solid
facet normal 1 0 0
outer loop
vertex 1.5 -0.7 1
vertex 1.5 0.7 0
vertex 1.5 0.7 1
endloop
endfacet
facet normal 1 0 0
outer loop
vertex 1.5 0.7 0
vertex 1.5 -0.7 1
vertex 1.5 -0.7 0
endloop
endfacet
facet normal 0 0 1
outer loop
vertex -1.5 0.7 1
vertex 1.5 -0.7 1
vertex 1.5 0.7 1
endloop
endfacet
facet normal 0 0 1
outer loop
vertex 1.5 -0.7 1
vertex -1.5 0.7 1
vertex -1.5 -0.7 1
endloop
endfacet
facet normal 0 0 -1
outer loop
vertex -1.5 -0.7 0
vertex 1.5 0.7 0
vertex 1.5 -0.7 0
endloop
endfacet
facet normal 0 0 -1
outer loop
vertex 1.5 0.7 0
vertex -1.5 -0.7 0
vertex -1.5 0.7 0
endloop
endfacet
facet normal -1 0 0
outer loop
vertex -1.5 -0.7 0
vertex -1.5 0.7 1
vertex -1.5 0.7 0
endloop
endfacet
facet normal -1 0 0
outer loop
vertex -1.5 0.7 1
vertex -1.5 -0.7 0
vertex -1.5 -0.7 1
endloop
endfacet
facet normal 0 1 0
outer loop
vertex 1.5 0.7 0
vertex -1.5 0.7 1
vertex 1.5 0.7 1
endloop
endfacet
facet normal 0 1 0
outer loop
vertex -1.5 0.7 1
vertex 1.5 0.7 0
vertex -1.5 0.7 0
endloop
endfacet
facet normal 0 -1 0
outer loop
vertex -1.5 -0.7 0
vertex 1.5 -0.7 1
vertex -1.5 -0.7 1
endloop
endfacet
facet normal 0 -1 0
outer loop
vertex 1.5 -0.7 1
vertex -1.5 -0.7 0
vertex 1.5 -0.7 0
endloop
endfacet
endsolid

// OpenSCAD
$fn=64;

smd_size = [3, 1.4, 1.0];

module smd_body(size=[3,1.4,1.0]) {
    translate([0,0,size[2]/2])
        cube(size, center=true);
}

module smd_terminal(size=[3,1.4,1.0], end_len=0.35, inset=0.02) {
    term = [end_len, size[1]-2*inset, size[2]*0.55];
    translate([0,0,term[2]/2])
        cube(term, center=true);
}

module smd(size=[3,1.4,1.0]) {
    union() {
        smd_body(size);
        translate([ size[0]/2 - 0.35/2, 0, 0]) smd_terminal(size);
        translate([-size[0]/2 + 0.35/2, 0, 0]) smd_terminal(size);
    }
}

smd(smd_size);
